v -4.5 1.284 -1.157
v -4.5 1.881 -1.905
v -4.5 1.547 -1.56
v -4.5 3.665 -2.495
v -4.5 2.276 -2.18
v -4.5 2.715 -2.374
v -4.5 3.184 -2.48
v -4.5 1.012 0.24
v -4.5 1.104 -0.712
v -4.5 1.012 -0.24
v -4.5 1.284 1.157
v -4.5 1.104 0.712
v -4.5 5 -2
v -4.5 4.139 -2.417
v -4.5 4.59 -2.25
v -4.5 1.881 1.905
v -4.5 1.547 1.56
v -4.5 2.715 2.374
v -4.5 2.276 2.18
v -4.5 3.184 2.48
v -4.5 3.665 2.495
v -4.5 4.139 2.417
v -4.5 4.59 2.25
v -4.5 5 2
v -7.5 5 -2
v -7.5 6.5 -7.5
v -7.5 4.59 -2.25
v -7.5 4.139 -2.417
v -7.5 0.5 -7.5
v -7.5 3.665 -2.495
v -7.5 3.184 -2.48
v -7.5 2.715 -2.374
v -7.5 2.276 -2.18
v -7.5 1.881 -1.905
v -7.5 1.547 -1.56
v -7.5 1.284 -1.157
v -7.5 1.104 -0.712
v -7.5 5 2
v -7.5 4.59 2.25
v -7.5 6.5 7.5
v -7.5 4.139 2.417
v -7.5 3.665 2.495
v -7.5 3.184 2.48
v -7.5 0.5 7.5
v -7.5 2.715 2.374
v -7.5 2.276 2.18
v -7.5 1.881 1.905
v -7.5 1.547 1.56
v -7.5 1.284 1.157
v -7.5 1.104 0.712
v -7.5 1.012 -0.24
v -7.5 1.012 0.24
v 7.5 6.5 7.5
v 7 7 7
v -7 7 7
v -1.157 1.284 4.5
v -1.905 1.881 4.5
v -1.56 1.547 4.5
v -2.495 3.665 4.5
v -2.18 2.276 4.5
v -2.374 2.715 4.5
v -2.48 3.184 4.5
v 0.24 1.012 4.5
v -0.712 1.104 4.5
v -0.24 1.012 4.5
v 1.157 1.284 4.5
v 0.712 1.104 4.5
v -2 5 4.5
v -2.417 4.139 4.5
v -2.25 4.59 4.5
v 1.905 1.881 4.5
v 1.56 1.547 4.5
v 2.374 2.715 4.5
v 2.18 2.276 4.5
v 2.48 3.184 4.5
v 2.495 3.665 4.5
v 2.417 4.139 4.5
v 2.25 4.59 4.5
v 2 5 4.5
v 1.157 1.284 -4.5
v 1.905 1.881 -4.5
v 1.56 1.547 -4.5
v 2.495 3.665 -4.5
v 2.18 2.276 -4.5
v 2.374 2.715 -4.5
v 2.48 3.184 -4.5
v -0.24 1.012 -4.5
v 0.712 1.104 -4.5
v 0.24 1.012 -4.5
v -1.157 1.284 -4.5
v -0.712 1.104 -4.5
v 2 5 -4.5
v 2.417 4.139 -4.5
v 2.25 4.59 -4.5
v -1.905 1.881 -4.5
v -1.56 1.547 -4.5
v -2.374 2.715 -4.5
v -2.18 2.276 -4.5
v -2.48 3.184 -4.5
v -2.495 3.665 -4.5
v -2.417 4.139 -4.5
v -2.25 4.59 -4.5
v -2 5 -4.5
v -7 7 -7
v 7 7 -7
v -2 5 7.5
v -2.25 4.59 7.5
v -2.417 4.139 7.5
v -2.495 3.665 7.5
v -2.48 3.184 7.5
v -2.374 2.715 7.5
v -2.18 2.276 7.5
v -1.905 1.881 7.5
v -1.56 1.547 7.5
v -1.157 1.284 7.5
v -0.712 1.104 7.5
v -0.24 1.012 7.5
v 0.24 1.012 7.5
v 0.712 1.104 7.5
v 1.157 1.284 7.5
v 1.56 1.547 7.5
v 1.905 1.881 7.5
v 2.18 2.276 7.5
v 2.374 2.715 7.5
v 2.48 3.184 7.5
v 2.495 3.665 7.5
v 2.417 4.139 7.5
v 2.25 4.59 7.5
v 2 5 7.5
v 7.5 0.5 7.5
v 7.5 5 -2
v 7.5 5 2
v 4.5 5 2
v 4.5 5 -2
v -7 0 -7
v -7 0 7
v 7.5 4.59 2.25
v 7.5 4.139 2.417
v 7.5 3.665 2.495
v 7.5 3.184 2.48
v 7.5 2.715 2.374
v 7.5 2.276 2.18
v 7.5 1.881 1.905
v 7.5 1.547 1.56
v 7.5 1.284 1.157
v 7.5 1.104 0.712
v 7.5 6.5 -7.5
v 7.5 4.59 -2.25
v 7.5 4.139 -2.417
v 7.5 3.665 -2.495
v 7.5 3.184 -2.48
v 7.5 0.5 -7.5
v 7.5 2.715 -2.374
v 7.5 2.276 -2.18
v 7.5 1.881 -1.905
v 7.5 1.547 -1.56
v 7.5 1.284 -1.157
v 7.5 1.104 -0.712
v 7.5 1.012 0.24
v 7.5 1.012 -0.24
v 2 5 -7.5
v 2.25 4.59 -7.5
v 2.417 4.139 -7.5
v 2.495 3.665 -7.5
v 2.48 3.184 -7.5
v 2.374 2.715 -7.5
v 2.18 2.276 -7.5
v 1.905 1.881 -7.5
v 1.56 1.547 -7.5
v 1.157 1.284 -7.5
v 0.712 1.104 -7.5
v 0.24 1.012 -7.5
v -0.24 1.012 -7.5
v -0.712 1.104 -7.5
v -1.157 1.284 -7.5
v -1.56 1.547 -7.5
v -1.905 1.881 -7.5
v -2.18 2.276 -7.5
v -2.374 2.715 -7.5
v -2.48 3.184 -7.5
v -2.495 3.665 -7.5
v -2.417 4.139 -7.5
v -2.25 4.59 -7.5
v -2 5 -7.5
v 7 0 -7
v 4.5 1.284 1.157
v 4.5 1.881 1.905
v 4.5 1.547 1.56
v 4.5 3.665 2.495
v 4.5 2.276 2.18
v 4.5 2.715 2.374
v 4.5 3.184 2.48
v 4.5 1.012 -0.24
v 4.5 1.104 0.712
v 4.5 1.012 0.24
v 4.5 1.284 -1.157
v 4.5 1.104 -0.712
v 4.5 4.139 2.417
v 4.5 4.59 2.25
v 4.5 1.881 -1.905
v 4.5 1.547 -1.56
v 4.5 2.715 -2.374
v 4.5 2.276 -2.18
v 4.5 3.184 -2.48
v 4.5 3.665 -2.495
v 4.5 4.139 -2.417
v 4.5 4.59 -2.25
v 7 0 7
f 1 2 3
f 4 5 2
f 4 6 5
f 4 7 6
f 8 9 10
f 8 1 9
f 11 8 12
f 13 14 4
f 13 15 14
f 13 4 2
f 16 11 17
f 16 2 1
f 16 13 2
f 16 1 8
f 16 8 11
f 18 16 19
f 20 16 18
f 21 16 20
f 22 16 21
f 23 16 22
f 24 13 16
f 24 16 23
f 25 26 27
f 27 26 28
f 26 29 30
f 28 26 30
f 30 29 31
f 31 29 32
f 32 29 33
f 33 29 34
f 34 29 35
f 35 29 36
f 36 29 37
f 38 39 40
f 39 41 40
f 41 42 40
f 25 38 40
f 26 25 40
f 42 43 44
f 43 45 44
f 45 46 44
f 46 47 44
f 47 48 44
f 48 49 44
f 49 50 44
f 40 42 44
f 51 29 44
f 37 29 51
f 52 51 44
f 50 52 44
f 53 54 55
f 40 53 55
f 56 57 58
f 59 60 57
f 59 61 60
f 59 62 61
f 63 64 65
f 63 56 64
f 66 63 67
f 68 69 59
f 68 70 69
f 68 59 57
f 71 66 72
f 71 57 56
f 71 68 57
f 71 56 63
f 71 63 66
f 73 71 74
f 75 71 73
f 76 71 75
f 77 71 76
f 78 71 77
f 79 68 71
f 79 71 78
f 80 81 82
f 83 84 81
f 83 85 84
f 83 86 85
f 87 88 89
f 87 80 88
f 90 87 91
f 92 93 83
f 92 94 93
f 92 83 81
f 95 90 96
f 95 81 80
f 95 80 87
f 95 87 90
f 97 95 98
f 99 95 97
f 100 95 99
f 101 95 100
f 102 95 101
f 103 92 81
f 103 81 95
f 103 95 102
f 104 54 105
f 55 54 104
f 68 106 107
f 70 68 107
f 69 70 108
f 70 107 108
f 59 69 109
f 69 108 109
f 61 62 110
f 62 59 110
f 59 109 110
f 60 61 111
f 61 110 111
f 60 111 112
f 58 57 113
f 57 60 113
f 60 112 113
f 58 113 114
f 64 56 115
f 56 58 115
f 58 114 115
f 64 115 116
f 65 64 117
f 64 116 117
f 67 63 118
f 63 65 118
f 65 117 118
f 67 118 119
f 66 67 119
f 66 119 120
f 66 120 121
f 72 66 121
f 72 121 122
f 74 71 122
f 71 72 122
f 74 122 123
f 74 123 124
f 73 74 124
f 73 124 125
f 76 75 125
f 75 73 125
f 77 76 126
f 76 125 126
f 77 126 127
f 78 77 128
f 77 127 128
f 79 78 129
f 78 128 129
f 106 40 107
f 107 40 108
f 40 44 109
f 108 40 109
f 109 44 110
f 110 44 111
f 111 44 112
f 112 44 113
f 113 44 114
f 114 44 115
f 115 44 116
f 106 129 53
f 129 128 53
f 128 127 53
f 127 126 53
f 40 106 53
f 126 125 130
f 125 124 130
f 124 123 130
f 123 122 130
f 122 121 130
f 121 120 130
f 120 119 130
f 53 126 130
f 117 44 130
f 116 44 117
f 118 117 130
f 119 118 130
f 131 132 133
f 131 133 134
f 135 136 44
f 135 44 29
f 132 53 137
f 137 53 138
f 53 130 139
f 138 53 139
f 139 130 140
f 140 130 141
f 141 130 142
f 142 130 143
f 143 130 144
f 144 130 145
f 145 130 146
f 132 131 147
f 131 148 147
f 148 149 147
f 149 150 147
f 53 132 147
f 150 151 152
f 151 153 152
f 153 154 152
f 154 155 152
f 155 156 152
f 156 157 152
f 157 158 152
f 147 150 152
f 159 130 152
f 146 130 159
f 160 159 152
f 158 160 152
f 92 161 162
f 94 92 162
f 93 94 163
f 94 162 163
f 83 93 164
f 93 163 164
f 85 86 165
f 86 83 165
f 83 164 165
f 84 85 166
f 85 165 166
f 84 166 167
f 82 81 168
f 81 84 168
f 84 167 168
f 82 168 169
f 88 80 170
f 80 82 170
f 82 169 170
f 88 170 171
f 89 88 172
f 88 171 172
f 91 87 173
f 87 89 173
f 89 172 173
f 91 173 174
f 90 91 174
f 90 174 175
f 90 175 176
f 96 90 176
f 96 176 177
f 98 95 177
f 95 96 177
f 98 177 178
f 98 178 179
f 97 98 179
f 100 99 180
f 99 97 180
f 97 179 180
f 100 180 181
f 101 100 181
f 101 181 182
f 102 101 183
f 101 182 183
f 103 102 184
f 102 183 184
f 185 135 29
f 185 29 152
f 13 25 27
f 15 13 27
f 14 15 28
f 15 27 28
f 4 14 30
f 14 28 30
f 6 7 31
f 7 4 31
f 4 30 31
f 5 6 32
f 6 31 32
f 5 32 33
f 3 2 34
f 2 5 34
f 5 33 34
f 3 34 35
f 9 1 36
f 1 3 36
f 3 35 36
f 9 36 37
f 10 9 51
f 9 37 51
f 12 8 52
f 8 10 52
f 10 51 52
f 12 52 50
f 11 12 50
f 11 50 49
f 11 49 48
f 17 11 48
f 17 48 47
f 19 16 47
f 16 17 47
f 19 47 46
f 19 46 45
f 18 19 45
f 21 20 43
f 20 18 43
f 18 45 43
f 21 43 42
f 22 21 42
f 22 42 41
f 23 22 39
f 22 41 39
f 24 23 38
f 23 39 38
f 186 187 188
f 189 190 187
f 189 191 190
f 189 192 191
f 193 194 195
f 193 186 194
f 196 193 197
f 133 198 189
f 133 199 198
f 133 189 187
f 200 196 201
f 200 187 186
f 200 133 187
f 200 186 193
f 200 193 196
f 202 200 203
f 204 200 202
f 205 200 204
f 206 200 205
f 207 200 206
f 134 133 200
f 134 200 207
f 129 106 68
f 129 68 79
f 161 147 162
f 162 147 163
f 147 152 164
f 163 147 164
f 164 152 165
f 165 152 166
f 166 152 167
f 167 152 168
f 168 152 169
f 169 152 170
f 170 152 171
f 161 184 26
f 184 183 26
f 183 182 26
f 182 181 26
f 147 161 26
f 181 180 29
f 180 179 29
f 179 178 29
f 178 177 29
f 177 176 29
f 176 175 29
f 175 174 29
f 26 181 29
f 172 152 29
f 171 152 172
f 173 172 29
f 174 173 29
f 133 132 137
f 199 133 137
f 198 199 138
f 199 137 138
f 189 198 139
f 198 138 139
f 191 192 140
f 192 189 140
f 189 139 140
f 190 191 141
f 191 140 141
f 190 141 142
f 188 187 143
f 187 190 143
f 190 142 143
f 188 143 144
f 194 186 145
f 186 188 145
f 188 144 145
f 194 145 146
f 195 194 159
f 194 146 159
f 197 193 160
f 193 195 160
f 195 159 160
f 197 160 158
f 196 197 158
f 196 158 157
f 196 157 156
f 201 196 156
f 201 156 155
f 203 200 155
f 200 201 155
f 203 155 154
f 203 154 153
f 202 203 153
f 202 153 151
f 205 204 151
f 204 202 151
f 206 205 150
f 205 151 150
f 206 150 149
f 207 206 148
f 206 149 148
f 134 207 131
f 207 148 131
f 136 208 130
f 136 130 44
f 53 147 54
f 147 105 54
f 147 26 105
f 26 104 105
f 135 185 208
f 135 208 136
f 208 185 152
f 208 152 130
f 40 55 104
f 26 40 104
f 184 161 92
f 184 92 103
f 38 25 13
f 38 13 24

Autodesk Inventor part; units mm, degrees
ref_plane "YZ Plane" through (0, 0, 0) normal (1, 0, 0) x (0, 1, 0)
ref_plane "XZ Plane" through (0, 0, 0) normal (0, 1, 0) x (-1, 0, 0)
ref_plane "XY Plane" through (0, 0, 0) normal (0, 0, 1) x (1, 0, 0)
sketch "스케치1" plane through (0, 0, 0) normal (0, 1, 0) x (-1, 0, 0)
  line L0 (7.5, 7.5) -> (-7.5, 7.5)
  line L1 (-7.5, 7.5) -> (-7.5, -7.5)
  line L2 (-7.5, -7.5) -> (7.5, -7.5)
  line L3 (7.5, -7.5) -> (7.5, 7.5)
  line L4 (7.5, 7.5) -> (-7.5, -7.5) construction
  line L5 (-7.5, 7.5) -> (7.5, -7.5) construction
  point P0 (0, 0)
  dimension "d0" = 15
  dimension "d1" = 15
extrude "돌출1" add sketch "스케치1" along normal blind 7
sketch "스케치2" plane through (-7.5, 0, 7.5) normal (0, 0, 1) x (1, 0, 0)
  circle A0 centre (7.5, 3.5) radius 2.5
  line L0 (0, 0) -> (15, 0) projected
  line L1 (0, 0) -> (0, 7) projected
  line L2 (5.5, 5) -> (9.5, 5)
  point P0 (7.5, 0)
  point P1 (7.5, 0)
  point P2 (0, 3.5)
  dimension "d5" = 5
  dimension "d14" = 1.5
chamfer "모따기1" distance 0.5 angle 45 8 edges at (0, 7, 7.5) (0, 0, 7.5) (7.5, 0, 0) (0, 0, -7.5) (-7.5, 0, 0) (-7.5, 7, 0) (0, 7, -7.5) (7.5, 7, 0)
extrude "돌출2" cut sketch "스케치2" against normal blind 3 contours A0 L2 picked at (8.1934, 3.1923)
pattern_circular "원형 패턴1" count 4 over 360 about axis through (0, -10, 0) along (0, 1, 0) of "돌출2"
properties part number "몸통"
